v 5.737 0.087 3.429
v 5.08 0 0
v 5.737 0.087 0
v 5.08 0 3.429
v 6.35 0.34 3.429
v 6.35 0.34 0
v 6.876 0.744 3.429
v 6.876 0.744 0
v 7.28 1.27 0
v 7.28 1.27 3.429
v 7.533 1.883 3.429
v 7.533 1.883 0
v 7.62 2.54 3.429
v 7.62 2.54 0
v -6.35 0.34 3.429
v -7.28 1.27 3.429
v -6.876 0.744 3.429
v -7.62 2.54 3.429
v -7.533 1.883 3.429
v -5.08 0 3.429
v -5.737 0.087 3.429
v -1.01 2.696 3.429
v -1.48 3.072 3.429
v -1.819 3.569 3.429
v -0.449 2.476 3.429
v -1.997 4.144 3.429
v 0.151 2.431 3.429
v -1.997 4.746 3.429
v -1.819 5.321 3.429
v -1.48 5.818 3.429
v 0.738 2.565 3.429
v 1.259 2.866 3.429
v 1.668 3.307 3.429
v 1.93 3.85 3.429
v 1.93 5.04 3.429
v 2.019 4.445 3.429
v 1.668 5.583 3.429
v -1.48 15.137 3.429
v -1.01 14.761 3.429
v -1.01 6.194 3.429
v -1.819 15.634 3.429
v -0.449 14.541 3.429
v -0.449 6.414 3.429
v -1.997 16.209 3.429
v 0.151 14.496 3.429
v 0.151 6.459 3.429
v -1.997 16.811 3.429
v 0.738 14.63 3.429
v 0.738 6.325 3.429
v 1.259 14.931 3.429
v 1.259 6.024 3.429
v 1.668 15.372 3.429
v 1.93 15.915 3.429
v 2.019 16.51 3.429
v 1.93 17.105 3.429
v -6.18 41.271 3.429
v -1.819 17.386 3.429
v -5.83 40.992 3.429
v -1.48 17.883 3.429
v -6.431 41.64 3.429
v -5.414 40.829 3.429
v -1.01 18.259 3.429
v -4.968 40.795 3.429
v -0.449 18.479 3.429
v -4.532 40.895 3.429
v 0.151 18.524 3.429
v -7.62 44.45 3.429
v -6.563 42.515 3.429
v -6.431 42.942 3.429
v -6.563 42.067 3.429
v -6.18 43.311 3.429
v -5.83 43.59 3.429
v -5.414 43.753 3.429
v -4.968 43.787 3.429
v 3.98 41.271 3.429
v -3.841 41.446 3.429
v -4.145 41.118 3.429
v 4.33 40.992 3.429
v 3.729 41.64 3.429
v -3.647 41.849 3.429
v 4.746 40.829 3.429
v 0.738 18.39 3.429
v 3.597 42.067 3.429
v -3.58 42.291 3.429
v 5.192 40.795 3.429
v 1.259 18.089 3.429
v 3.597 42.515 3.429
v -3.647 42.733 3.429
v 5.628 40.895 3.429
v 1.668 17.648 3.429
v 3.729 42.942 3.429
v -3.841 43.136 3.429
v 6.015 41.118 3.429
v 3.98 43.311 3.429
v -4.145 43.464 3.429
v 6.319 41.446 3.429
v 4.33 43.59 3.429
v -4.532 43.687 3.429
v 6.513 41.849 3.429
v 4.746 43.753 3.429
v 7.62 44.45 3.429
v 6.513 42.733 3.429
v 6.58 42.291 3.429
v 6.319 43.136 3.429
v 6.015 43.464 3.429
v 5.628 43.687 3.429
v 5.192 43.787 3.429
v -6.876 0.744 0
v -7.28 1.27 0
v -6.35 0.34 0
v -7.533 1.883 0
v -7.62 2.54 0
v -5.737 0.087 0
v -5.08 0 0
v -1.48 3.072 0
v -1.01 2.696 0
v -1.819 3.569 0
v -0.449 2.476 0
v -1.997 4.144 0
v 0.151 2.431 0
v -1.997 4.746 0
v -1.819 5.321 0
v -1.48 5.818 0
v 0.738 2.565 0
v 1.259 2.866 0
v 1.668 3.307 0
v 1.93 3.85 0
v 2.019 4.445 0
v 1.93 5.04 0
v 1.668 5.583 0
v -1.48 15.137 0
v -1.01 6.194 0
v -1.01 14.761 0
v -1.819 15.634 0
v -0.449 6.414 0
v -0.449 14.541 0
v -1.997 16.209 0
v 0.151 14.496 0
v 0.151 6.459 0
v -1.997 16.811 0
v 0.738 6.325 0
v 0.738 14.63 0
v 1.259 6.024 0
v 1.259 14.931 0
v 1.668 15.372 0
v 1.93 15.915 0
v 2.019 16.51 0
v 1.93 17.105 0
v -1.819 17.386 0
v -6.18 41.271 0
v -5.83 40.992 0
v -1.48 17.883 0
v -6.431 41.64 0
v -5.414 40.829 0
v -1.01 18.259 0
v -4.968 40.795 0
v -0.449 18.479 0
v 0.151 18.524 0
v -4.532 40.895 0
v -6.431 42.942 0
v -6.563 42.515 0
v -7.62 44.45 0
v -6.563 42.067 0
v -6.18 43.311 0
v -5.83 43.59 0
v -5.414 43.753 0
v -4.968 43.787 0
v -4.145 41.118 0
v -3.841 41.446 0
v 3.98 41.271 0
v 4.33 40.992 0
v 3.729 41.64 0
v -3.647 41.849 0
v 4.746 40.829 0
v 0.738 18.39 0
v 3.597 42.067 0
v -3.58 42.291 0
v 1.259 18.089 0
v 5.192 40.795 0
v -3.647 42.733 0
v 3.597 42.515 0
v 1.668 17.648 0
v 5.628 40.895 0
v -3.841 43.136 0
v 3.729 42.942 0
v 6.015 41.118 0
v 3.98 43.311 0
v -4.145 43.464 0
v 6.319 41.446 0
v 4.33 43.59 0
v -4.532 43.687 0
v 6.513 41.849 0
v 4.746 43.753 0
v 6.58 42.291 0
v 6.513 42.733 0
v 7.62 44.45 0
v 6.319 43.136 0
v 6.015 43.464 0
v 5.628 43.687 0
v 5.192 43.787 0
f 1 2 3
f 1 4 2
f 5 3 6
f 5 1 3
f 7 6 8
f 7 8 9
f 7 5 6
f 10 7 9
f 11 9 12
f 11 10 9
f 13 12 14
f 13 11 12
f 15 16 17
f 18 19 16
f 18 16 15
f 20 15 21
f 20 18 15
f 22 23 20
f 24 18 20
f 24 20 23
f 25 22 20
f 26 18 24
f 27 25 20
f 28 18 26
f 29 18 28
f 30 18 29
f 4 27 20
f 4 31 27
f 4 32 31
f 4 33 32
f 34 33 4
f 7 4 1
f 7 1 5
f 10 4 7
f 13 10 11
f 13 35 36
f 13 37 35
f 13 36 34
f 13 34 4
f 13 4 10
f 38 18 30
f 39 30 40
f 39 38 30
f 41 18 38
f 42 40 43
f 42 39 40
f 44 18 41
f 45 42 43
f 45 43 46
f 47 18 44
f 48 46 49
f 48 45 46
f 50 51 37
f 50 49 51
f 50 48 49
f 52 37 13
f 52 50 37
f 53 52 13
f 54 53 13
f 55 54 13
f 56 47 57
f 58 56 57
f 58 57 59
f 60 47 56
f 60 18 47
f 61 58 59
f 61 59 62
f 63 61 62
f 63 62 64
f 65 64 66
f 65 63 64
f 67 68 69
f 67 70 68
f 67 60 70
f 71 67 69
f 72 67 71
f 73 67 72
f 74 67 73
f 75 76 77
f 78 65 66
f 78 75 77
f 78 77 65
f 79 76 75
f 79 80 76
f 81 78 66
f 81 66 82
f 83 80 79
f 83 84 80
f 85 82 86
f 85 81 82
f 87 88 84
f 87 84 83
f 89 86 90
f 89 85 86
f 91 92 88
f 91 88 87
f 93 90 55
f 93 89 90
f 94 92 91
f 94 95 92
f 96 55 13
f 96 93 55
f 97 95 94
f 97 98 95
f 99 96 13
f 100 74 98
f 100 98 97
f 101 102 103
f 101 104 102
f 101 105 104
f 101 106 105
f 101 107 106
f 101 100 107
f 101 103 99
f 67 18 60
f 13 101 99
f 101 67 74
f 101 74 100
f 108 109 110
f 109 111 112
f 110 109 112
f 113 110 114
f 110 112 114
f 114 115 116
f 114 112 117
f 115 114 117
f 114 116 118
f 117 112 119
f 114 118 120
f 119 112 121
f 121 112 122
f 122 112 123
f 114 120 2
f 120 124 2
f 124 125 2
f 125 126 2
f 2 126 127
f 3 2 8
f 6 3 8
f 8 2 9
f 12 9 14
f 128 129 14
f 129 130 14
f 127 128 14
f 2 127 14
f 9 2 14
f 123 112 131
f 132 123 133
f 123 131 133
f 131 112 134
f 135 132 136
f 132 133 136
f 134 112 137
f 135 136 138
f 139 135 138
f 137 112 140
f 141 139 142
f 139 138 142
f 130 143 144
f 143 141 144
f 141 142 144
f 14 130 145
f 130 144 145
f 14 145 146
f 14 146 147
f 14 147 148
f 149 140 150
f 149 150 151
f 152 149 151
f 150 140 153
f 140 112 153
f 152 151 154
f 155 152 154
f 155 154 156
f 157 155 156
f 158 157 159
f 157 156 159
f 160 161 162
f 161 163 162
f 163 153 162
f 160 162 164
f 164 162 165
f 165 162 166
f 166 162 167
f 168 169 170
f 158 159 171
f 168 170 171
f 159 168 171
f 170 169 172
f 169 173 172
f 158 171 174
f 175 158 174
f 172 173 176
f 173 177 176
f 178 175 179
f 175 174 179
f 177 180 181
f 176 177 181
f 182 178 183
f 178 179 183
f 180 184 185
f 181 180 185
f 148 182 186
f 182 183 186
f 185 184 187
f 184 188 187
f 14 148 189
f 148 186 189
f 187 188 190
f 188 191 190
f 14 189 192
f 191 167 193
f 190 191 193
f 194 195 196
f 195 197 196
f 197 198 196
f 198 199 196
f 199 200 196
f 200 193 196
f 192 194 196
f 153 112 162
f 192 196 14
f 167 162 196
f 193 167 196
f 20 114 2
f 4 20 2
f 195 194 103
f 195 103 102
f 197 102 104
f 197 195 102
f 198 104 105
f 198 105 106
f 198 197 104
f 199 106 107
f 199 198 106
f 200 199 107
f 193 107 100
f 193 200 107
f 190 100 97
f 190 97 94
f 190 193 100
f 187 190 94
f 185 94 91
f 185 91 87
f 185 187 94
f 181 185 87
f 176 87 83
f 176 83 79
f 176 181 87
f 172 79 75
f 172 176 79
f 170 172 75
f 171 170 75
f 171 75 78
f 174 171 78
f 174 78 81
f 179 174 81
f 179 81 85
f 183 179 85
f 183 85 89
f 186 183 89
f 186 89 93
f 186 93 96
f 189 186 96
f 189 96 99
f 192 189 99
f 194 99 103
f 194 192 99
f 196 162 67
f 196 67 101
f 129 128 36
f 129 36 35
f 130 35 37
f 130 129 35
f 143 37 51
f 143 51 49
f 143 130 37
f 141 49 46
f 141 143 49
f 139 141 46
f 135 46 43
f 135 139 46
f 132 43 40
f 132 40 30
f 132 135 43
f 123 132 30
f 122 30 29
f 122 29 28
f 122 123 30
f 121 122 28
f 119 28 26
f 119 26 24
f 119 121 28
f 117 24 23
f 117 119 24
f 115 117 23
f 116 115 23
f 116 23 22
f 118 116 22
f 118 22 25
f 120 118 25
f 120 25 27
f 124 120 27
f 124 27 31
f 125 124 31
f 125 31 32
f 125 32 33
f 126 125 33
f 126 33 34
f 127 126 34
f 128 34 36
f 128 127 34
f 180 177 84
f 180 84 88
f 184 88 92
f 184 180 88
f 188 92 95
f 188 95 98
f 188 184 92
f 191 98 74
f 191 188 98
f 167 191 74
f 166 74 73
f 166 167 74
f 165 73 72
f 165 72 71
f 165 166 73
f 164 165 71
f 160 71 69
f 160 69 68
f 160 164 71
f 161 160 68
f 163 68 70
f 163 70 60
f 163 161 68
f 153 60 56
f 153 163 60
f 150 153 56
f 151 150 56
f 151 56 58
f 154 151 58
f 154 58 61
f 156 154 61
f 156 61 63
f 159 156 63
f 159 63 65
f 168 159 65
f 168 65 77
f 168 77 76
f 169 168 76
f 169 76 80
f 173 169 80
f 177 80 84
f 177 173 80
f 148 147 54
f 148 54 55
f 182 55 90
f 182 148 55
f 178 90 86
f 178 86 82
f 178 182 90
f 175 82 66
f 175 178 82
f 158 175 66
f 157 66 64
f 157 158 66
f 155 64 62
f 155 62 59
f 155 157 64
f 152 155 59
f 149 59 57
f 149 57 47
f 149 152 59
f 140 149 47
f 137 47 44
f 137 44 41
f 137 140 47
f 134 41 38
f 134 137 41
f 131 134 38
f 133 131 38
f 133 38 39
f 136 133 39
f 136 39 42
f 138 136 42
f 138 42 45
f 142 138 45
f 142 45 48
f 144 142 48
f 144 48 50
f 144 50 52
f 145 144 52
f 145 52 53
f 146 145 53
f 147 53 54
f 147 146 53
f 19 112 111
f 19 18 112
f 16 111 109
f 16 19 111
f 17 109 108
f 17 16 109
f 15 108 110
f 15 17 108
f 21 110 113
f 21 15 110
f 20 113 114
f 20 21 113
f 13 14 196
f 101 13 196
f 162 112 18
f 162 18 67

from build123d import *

# Parameters (mm, degrees)
SKETCH1_W           = 15.24
SKETCH1_H           = 44.45
SKETCH1_R           = 2.0193
SKETCH1_R_2         = 1.5
BOSS_EXTRUDE1_DEPTH = 3.429
FILLET1_R           = 2.54


with BuildPart() as part:
    # Sketch1 → Boss-Extrude1 (new body)
    with BuildSketch(Plane.XY):
        with Locations((0, 22.225)):
            Rectangle(SKETCH1_W, SKETCH1_H)
        with Locations((0, 4.445)):
            Circle(SKETCH1_R, mode=Mode.SUBTRACT)
        with Locations((0, 16.51)):
            Circle(SKETCH1_R, mode=Mode.SUBTRACT)
        with Locations((-5.08, 42.291)):
            Circle(SKETCH1_R_2, mode=Mode.SUBTRACT)
        with Locations((5.08, 42.291)):
            Circle(SKETCH1_R_2, mode=Mode.SUBTRACT)
    extrude(amount=BOSS_EXTRUDE1_DEPTH)

    # Fillet1
    fillet1_edges = [part.edges().sort_by_distance(p)[0] for p in [
        (7.62, 0, 1.7145),
        (-7.62, 0, 1.7145),
    ]]
    fillet(fillet1_edges, radius=FILLET1_R)


solid = part.part
